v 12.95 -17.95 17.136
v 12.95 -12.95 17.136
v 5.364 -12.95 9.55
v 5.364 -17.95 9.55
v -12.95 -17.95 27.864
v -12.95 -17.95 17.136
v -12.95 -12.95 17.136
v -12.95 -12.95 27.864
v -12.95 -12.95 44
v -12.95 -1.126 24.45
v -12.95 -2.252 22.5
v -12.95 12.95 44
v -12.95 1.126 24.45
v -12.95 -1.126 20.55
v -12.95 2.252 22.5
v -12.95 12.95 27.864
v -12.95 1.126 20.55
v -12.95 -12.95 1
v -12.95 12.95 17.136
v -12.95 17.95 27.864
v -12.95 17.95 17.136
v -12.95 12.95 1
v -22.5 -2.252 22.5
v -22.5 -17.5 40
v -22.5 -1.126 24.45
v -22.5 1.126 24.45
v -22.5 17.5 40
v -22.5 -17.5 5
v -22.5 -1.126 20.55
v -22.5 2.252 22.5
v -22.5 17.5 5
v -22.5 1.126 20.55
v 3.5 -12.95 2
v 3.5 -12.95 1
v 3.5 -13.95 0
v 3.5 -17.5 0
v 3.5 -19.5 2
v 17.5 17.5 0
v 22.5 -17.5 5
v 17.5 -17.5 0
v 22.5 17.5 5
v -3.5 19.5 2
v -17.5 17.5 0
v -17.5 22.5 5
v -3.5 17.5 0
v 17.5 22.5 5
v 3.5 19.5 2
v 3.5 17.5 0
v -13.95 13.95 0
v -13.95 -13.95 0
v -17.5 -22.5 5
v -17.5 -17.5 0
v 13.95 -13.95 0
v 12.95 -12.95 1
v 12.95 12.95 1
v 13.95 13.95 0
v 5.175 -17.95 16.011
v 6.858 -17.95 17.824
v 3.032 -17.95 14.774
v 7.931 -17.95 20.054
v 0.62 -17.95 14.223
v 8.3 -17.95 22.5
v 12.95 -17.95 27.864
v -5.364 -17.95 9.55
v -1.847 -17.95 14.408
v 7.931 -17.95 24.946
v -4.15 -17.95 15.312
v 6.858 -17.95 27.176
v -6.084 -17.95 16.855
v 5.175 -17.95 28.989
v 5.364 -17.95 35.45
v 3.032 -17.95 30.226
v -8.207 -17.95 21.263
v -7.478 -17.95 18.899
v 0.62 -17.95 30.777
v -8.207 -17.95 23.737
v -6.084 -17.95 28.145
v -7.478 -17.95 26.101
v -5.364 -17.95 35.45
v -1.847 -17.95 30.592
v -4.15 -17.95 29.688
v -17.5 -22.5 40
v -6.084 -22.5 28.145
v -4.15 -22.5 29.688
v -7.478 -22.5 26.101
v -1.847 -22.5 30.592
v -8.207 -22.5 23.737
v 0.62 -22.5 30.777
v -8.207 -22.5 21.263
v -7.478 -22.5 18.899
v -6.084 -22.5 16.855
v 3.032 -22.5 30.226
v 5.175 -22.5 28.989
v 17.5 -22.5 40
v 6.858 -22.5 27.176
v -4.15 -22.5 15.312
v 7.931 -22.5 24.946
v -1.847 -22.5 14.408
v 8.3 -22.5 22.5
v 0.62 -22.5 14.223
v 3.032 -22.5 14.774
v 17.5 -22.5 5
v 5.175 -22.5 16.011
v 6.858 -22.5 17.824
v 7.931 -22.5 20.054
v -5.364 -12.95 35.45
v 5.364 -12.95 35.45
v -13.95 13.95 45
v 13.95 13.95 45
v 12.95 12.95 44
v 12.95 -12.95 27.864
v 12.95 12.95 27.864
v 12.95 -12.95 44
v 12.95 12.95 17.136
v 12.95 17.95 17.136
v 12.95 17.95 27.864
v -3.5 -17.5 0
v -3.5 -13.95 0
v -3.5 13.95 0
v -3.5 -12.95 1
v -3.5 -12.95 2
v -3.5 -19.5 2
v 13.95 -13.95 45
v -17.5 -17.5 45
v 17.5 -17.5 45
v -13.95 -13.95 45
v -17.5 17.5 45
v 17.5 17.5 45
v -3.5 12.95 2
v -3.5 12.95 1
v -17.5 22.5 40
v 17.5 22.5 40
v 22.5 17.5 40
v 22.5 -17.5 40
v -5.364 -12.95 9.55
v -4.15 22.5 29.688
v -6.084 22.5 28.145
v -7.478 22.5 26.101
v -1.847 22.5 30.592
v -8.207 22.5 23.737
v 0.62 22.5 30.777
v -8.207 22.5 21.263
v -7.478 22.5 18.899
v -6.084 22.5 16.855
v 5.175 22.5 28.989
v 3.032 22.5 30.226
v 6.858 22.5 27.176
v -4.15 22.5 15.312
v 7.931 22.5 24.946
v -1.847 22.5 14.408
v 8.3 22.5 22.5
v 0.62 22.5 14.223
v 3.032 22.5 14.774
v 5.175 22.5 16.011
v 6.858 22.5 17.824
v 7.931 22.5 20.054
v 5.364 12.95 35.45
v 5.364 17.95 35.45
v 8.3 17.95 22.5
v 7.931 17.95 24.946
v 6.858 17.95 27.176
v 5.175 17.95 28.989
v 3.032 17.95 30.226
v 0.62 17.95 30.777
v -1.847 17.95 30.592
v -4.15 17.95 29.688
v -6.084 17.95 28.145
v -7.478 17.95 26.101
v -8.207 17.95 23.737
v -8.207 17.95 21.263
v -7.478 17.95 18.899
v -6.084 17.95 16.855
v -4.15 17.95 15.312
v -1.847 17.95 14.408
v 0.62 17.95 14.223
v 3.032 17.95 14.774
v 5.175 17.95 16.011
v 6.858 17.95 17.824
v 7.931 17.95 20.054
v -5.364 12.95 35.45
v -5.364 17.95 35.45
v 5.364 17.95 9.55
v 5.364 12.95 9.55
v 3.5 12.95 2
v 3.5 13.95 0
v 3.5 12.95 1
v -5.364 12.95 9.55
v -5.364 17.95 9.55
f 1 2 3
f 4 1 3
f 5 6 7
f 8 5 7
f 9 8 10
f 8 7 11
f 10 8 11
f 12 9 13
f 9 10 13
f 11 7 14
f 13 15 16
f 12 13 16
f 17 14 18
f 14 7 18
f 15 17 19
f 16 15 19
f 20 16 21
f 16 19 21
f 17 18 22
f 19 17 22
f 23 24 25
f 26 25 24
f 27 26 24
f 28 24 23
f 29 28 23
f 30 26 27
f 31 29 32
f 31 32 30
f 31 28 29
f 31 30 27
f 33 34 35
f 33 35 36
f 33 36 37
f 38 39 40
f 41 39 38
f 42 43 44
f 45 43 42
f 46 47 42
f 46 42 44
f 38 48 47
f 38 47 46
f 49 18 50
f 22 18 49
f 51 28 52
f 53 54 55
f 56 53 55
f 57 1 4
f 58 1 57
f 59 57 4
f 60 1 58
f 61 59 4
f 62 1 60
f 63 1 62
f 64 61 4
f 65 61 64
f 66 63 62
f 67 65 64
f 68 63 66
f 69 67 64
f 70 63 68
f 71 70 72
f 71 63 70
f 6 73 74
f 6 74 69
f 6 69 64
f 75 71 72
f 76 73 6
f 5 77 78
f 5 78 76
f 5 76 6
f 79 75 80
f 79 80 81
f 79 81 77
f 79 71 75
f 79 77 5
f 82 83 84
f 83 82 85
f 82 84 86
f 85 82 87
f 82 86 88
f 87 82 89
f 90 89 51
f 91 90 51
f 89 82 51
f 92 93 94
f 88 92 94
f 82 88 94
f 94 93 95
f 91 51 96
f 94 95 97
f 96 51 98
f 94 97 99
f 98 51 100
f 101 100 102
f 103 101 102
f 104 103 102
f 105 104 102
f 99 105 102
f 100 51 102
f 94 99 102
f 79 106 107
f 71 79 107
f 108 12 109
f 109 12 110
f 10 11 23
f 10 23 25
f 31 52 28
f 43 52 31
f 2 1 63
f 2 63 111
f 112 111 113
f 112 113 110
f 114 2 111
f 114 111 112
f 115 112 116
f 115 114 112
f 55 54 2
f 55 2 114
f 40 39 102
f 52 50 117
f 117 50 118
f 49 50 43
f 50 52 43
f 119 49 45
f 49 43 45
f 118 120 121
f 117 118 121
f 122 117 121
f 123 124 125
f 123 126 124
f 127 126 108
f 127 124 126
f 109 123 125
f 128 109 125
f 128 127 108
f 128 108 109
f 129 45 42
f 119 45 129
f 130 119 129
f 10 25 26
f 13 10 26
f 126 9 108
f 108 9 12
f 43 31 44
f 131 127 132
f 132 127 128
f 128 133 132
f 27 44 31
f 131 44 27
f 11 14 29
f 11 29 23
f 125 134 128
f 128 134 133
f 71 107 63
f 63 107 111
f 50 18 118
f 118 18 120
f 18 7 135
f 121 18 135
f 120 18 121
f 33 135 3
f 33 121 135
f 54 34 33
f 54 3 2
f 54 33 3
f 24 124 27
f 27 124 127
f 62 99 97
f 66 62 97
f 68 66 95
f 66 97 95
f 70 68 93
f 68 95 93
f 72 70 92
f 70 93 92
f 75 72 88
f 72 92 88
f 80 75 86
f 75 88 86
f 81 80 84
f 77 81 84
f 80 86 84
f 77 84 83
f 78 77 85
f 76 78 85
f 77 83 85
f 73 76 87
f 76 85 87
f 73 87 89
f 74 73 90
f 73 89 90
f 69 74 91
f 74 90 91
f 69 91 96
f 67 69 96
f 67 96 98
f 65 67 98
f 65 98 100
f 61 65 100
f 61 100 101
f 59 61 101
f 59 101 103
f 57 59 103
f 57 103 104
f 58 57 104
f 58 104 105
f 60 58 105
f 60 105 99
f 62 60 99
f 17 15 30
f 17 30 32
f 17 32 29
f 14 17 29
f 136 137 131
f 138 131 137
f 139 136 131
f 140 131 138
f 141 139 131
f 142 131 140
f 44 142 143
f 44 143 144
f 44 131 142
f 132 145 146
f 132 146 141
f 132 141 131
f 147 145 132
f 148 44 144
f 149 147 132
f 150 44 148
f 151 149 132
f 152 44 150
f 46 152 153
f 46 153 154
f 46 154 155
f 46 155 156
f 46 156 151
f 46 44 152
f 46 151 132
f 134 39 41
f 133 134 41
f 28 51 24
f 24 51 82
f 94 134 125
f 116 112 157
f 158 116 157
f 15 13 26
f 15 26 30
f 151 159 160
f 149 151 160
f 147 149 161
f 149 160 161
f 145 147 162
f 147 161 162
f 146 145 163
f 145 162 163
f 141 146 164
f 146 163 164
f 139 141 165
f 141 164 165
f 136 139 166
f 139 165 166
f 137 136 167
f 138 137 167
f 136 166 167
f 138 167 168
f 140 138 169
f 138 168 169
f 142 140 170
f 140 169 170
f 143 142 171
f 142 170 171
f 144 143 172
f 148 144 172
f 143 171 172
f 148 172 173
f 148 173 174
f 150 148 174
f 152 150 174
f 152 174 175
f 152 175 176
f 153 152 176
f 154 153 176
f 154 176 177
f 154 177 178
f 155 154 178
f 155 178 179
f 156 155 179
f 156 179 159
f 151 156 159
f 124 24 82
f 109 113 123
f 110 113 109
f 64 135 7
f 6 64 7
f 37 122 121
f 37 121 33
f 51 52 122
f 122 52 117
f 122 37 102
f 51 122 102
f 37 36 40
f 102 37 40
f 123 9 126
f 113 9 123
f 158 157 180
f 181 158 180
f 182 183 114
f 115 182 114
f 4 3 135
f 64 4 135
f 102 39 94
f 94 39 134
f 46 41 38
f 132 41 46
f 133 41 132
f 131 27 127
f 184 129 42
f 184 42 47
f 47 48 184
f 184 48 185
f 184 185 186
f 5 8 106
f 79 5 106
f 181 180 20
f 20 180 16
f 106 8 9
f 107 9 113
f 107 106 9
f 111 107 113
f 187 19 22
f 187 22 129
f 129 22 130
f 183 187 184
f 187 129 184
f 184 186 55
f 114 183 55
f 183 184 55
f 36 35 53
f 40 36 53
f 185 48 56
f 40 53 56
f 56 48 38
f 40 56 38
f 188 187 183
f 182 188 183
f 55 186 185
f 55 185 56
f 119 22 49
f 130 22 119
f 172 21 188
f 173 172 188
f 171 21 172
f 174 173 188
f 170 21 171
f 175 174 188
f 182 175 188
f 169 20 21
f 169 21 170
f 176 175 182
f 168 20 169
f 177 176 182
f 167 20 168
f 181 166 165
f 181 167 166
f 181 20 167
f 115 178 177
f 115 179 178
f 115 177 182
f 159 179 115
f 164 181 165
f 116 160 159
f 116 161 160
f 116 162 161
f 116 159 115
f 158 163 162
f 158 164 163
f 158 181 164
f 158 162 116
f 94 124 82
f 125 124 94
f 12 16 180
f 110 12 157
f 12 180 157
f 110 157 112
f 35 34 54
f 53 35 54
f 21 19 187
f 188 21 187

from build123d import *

# Parameters (mm, degrees)
F0_W      = 45
F0_H      = 45
F0_W_2    = 25.9
F0_H_2    = 25.9
F1_DEPTH  = 45
F2_R      = 8.3
F3_DEPTH  = 45.001
F5_DEPTH  = 5
F7_DEPTH  = 5
F9_SIZE   = 5
F10_DEPTH = 9.55
F11_SIZE  = 1
F12_W     = 7
F12_H     = 60
F13_DEPTH = 2


# Not quite as in the source:
# - a feature names something its author has since deleted; it is built from what else it names


with BuildPart() as f1:
    # F0 (on Top) → F1 (new body)
    with BuildSketch(Plane.XY):
        Rectangle(F0_W, F0_H)
        Rectangle(F0_W_2, F0_H_2, mode=Mode.SUBTRACT)
    extrude(amount=F1_DEPTH)

    # F2 (on face) → F3 (cut, through all)
    with BuildSketch(Plane.XZ.offset(22.5)):
        with Locations((0, 22.5)):
            Circle(F2_R)
    extrude(amount=-F3_DEPTH, mode=Mode.SUBTRACT)

    # F4 (on face) → F5 (cut)
    with BuildSketch(Plane.XZ.offset(-12.95)):
        Polygon((12.95, 17.1359343673), (12.95, 27.8640656327), (5.3640656327, 35.45), (-5.3640656327, 35.45), (-12.95, 27.8640656327), (-12.95, 17.1359343673), (-5.3640656327, 9.55), (5.3640656327, 9.55), align=None)
    extrude(amount=-F5_DEPTH, mode=Mode.SUBTRACT)

    # F6 (on face) → F7 (cut)
    with BuildSketch(Plane(origin=(0, -12.95, 0), x_dir=(-1, 0, 0), z_dir=(0, 1, 0))):
        Polygon((12.95, 17.1359343673), (12.95, 27.8640656327), (5.3640656327, 35.45), (-5.3640656327, 35.45), (-12.95, 27.8640656327), (-12.95, 17.1359343673), (-5.3640656327, 9.55), (5.3640656327, 9.55), align=None)
    extrude(amount=-F7_DEPTH, mode=Mode.SUBTRACT)

    # F9
    f9_edges = [f1.edges().sort_by_distance(p)[0] for p in [
        (22.5, -22.5, 22.5),
        (22.5, 22.5, 22.5),
        (22.5, 0, 0),
        (22.5, 0, 45),
        (-22.5, 22.5, 22.5),
        (-22.5, -22.5, 22.5),
        (-22.5, 0, 0),
        (-22.5, 0, 45),
        (0, -22.5, 0),
        (0, -22.5, 45),
        (0, 22.5, 45),
        (0, 22.5, 0),
    ]]
    chamfer(f9_edges, length=F9_SIZE)

    # F8 (on face) → F10 (cut, through all)
    with BuildSketch(Plane(origin=(-22.5, 0, 0), x_dir=(0, -1, 0), z_dir=(-1, 0, 0))):
        Polygon((1.1258330249, 20.55), (2.2516660498, 22.5), (1.1258330249, 24.45), (-1.1258330249, 24.45), (-2.2516660498, 22.5), (-1.1258330249, 20.55), align=None)
    extrude(amount=-F10_DEPTH, mode=Mode.SUBTRACT)

    # F11
    f11_edges = [f1.edges().sort_by_distance(p)[0] for p in [
        (12.95, 0, 45),
        (0, -12.95, 45),
        (-12.95, 0, 45),
        (0, 12.95, 45),
        (-12.95, 0, 0),
        (0, 12.95, 0),
        (12.95, 0, 0),
        (0, -12.95, 0),
    ]]
    chamfer(f11_edges, length=F11_SIZE)

    # F12 (on face) → F13 (cut)
    with BuildSketch(Plane(origin=(0, 0, 0), x_dir=(1, 0, 0), z_dir=(0, 0, -1))):
        Rectangle(F12_W, F12_H)
    extrude(amount=-F13_DEPTH, mode=Mode.SUBTRACT)


solid = f1.part
